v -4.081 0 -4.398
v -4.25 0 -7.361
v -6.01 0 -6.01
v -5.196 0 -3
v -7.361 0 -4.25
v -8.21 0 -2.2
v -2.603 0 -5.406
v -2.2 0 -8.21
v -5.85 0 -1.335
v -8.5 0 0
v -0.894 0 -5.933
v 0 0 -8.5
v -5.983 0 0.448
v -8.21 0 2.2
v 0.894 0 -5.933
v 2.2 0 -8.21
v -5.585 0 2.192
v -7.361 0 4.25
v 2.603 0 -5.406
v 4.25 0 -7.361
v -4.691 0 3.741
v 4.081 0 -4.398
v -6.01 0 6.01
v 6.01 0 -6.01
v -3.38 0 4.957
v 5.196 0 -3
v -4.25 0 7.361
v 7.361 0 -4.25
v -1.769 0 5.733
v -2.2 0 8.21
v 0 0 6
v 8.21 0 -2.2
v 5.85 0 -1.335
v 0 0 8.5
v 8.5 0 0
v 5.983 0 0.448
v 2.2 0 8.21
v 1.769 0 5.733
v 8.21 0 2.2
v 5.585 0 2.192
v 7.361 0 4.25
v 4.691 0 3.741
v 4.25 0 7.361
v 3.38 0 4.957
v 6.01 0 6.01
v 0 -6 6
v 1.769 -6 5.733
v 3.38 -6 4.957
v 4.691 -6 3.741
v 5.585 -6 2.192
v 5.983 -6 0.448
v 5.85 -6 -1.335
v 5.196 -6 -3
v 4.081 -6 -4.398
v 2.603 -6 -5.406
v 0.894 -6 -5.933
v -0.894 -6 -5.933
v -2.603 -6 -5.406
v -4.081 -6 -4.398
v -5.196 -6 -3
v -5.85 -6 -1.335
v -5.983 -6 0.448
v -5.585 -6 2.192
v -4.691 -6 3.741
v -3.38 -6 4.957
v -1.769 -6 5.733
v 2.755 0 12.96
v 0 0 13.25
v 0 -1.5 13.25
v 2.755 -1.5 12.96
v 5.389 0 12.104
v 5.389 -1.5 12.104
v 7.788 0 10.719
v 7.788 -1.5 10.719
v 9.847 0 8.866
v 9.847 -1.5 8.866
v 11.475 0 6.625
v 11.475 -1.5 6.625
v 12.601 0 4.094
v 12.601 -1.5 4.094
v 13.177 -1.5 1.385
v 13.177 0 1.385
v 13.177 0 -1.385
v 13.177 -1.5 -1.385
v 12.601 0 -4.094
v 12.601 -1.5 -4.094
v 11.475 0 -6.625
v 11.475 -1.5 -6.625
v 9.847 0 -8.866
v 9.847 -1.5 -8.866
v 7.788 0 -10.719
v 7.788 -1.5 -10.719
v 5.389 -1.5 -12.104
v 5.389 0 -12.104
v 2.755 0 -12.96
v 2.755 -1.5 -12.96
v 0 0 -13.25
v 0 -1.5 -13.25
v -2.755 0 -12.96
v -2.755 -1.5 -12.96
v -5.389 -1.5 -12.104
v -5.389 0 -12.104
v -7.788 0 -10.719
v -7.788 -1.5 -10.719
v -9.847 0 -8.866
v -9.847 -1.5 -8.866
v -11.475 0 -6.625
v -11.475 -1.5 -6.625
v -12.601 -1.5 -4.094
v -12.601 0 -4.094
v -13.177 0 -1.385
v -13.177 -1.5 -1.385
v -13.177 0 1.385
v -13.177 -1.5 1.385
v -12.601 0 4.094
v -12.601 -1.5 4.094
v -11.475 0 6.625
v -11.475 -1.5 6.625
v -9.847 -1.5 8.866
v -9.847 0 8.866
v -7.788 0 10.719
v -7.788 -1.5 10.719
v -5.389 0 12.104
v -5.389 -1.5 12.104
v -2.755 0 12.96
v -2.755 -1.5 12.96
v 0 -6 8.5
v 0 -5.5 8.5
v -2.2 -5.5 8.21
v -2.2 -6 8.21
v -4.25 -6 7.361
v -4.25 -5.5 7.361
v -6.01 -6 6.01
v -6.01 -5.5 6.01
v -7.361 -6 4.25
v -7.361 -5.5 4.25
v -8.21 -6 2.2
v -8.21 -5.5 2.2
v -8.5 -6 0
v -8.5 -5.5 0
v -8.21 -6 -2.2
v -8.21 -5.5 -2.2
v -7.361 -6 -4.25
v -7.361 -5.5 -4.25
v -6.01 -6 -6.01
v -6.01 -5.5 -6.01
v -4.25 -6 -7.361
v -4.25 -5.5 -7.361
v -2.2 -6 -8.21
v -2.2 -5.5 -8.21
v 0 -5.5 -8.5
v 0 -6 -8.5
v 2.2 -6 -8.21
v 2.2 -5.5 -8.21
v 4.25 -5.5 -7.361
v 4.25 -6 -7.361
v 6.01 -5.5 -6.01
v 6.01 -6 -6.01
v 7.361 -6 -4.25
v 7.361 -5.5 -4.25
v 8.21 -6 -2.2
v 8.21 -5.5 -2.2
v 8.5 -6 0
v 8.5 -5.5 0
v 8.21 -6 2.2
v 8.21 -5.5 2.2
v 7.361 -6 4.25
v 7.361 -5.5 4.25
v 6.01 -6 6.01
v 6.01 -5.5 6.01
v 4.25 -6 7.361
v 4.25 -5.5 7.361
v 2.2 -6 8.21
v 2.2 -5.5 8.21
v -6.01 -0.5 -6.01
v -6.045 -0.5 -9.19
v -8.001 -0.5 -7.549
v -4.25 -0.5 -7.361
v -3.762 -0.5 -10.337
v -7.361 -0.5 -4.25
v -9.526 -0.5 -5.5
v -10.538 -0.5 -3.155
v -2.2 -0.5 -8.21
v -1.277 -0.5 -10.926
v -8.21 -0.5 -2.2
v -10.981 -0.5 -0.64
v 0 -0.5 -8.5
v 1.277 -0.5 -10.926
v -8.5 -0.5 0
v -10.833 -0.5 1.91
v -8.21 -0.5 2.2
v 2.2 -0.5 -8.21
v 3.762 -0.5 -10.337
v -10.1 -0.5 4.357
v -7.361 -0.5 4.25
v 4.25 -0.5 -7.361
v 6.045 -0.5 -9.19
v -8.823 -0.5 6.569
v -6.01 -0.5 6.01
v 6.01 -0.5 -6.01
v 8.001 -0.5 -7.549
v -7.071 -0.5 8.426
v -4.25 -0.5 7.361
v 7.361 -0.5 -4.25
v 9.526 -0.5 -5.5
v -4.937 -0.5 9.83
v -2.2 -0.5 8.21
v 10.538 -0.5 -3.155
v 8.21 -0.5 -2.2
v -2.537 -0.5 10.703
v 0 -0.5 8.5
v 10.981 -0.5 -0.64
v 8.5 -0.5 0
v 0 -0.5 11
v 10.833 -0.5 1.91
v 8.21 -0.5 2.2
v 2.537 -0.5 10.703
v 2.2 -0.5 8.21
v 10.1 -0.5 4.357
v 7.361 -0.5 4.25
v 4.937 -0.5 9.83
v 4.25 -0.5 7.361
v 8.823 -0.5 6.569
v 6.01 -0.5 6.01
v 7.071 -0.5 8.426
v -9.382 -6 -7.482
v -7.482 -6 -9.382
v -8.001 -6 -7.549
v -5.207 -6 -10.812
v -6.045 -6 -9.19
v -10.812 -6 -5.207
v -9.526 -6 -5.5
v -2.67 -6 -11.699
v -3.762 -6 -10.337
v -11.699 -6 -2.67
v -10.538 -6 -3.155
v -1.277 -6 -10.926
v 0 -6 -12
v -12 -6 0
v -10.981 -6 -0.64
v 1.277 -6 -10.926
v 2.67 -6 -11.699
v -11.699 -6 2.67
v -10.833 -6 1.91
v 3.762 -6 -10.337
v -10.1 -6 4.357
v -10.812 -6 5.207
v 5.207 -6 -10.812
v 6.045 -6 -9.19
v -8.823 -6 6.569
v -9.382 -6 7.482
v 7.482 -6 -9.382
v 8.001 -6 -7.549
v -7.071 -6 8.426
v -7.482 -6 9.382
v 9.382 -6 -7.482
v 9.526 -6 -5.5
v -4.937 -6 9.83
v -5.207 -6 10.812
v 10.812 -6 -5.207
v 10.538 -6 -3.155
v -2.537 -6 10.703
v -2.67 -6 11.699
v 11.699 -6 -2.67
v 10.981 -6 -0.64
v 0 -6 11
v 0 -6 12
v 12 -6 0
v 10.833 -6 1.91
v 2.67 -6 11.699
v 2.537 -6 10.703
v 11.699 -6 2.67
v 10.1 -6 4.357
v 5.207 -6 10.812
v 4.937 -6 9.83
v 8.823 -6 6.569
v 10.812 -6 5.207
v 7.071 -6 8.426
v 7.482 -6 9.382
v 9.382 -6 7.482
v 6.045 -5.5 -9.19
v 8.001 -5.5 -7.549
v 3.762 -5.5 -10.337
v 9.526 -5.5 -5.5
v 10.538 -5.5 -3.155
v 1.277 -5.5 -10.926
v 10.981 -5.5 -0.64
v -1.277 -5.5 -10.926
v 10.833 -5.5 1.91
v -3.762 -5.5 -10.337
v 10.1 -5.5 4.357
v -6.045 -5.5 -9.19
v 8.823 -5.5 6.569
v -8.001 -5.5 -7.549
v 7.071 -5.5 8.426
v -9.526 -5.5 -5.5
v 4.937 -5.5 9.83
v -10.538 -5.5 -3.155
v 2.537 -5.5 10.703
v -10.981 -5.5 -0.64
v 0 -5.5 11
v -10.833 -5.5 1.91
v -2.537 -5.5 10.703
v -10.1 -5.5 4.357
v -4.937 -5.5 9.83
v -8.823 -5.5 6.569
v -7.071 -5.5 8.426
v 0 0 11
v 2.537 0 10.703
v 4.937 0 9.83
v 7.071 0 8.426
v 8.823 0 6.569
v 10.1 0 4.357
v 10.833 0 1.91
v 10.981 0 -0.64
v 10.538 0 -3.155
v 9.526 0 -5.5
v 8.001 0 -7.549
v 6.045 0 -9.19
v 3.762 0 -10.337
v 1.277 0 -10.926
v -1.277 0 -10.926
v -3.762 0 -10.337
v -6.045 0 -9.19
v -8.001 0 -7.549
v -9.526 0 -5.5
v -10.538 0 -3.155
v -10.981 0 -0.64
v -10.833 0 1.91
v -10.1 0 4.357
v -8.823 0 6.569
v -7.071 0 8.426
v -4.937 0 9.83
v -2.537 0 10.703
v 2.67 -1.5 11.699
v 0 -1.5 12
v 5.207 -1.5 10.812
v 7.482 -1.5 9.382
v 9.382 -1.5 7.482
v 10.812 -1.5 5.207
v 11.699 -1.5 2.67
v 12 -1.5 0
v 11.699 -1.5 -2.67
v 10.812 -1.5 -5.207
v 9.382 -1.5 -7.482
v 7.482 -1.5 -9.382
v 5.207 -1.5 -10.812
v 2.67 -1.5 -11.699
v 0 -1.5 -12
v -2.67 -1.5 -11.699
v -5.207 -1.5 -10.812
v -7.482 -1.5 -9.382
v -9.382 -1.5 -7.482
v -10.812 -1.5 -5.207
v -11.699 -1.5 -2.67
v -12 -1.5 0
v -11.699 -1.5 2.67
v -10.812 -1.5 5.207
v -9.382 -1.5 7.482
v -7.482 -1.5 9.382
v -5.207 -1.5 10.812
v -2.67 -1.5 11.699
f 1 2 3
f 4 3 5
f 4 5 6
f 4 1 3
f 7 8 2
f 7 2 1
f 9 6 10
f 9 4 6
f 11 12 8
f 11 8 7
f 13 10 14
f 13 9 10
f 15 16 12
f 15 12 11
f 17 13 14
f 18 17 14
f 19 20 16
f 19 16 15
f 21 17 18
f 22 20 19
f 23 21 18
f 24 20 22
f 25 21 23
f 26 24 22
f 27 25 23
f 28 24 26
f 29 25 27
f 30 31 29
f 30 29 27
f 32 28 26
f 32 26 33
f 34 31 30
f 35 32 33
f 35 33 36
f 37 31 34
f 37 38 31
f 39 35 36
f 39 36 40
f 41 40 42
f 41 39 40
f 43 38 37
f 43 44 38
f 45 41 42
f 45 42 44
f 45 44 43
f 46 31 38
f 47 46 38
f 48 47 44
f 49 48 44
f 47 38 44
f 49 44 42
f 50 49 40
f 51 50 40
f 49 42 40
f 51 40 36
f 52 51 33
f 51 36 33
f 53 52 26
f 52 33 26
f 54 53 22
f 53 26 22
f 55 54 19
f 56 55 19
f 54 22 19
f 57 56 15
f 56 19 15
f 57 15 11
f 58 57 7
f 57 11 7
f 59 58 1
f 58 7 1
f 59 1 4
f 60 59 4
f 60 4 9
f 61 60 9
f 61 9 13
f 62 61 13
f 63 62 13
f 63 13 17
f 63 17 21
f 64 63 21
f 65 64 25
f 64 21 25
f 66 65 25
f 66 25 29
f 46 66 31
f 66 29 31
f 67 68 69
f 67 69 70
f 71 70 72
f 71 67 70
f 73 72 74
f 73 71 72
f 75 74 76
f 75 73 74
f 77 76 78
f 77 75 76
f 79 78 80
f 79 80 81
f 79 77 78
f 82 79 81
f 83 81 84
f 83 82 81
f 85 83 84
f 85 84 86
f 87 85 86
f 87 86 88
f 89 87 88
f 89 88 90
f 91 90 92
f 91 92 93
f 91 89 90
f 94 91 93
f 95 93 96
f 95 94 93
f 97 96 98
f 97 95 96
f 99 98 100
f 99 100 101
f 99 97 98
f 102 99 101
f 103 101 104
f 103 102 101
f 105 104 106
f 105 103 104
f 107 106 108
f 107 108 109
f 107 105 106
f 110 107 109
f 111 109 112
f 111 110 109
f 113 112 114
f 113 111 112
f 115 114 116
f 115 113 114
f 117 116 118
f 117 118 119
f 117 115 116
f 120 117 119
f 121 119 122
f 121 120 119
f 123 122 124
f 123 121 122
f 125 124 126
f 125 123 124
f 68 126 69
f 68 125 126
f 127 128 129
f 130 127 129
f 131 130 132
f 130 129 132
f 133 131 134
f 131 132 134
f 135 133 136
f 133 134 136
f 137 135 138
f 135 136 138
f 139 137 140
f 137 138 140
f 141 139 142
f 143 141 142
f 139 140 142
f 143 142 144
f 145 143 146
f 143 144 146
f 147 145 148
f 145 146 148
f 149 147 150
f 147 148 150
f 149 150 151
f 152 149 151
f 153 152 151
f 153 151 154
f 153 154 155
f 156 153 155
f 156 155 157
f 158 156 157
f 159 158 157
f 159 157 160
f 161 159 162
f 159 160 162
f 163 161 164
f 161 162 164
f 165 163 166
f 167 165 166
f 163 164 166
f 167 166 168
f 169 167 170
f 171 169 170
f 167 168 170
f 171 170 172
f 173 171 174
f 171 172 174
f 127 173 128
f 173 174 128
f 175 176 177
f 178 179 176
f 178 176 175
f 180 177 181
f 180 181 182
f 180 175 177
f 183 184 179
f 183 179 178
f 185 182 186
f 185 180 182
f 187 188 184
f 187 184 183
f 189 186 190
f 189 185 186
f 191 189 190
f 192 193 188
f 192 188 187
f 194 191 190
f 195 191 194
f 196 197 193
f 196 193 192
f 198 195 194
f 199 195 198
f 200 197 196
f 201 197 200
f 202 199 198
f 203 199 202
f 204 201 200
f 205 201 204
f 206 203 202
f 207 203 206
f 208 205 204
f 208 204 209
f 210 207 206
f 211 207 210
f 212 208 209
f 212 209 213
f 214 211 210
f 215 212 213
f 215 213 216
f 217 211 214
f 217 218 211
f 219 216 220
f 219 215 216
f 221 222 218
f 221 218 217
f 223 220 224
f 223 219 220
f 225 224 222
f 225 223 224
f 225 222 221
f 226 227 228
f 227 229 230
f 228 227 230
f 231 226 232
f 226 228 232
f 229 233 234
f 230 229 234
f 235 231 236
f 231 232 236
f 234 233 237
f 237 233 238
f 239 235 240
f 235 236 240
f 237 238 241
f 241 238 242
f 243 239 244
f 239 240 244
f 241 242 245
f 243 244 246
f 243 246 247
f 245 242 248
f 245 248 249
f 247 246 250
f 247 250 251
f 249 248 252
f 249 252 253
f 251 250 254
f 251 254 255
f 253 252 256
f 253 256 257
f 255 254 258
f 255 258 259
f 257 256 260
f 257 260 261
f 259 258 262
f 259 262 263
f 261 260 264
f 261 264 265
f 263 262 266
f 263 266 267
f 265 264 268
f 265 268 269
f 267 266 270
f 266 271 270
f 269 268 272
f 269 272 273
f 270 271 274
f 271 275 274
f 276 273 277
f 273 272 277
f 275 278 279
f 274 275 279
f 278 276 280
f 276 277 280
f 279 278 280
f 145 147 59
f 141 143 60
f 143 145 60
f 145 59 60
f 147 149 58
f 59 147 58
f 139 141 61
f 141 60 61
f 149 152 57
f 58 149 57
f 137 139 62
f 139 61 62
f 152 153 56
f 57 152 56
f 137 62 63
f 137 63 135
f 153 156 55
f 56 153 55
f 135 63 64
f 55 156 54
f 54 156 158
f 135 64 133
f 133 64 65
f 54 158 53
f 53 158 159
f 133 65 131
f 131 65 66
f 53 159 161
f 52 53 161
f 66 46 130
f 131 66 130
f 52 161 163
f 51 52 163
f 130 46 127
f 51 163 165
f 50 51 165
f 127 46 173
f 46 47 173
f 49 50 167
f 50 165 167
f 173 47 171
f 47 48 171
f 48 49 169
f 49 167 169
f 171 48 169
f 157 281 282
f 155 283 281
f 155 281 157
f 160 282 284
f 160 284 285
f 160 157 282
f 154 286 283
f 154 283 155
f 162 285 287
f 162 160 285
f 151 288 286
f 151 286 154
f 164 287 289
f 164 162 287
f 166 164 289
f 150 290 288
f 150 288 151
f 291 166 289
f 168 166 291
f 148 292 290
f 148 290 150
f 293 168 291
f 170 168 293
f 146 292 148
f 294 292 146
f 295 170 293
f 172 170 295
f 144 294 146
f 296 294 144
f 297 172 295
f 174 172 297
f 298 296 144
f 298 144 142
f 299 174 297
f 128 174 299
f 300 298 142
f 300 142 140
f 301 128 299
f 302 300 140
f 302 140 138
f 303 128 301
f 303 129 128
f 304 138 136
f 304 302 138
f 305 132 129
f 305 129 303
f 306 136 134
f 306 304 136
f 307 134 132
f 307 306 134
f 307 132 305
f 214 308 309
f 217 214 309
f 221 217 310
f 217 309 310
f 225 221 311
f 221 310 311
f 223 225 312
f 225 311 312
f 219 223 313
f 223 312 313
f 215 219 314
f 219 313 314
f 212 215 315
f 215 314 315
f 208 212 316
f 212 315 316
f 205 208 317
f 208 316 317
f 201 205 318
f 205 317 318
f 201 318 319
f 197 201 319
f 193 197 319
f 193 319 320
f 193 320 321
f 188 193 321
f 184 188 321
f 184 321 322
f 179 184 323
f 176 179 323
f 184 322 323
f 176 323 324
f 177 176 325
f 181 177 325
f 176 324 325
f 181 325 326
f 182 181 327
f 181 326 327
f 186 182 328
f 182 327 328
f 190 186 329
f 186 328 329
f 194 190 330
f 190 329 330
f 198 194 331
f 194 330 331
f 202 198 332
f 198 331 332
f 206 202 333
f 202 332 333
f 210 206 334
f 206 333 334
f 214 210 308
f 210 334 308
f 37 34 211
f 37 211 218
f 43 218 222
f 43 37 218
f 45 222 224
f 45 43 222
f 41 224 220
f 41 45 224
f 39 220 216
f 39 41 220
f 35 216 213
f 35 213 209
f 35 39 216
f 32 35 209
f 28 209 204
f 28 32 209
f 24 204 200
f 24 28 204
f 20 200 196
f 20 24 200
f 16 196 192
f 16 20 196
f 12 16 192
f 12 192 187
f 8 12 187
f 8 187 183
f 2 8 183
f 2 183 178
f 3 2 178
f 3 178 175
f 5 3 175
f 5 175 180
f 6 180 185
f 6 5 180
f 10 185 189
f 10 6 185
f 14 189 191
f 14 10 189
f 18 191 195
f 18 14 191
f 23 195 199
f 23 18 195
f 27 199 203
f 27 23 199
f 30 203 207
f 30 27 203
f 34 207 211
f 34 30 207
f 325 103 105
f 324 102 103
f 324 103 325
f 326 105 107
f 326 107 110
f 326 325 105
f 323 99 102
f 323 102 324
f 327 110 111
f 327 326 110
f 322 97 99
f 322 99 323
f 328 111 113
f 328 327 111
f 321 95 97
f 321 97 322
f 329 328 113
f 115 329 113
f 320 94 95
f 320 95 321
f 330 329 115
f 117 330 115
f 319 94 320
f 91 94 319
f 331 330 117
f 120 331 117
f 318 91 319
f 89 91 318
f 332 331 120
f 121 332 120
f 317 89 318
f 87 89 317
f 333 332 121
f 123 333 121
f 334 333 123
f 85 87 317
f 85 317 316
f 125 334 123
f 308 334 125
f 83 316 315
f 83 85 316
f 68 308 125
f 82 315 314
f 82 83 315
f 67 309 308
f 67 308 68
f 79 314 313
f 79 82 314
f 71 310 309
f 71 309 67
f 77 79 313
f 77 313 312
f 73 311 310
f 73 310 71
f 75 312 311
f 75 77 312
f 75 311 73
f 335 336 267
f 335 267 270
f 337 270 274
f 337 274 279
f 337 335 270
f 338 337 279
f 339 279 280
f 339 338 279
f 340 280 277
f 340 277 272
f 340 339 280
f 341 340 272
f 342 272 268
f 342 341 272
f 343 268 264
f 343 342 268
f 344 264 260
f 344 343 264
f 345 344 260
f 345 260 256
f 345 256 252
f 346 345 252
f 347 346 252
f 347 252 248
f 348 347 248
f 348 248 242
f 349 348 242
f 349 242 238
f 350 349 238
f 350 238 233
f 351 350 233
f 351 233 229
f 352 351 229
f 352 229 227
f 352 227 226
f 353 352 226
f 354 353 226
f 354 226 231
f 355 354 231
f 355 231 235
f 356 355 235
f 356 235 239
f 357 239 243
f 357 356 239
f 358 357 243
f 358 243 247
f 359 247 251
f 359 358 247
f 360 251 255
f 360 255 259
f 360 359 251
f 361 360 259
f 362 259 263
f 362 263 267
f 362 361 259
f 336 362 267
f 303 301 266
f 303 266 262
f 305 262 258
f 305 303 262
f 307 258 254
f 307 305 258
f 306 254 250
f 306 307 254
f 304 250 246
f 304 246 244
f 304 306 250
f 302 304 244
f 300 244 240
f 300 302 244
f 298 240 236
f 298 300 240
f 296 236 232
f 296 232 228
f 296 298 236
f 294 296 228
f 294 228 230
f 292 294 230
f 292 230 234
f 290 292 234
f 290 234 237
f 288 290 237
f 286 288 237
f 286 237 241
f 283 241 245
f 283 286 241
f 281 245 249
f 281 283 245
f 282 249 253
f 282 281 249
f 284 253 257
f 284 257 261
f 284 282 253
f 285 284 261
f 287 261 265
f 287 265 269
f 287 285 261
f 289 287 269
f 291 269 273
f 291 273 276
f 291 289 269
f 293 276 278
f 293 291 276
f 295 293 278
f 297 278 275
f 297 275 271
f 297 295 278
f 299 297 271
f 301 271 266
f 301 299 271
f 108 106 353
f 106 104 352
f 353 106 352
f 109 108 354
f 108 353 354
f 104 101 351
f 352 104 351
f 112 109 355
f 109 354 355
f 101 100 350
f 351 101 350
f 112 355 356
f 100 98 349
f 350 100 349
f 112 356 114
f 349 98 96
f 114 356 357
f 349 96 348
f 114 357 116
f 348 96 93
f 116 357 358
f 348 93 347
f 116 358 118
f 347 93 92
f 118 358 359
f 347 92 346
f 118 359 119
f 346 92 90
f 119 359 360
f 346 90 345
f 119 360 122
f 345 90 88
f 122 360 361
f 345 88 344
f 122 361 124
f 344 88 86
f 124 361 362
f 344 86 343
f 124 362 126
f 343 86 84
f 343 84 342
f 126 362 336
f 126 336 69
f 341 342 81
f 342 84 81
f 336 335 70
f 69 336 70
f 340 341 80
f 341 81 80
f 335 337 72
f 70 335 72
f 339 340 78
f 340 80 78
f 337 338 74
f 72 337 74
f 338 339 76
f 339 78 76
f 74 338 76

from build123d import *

# Parameters (mm, degrees)
SKETCH1_R           = 12
SKETCH1_R_2         = 6
BOSS_EXTRUDE1_DEPTH = 6
SKETCH1_3_R         = 13.25
SKETCH1_3_R_2       = 12
BOSS_EXTRUDE2_DEPTH = 1.5
SKETCH2_R           = 11
SKETCH2_R_2         = 8.5
CUT_EXTRUDE1_DEPTH  = 0.5
CUT_EXTRUDE2_START  = -0.5
SKETCH3_R           = 11
SKETCH3_R_2         = 8.5
CUT_EXTRUDE2_DEPTH  = 0.5


with BuildPart() as part:
    # Sketch1 → Boss-Extrude1 (new body)
    with BuildSketch(Plane(origin=(0, 0, 0), x_dir=(1, 0, 0), z_dir=(0, 1, 0))):
        Circle(SKETCH1_R)
        Circle(SKETCH1_R_2, mode=Mode.SUBTRACT)
    extrude(amount=-BOSS_EXTRUDE1_DEPTH)

    # Sketch1<3> → Boss-Extrude2 (add)
    with BuildSketch(Plane(origin=(0, 0, 0), x_dir=(1, 0, 0), z_dir=(0, 1, 0))):
        Circle(SKETCH1_3_R)
        Circle(SKETCH1_3_R_2, mode=Mode.SUBTRACT)
    extrude(amount=-BOSS_EXTRUDE2_DEPTH)

    # Sketch2 → Cut-Extrude1 (cut)
    with BuildSketch(Plane(origin=(0, 0, 0), x_dir=(1, 0, 0), z_dir=(0, 1, 0))):
        Circle(SKETCH2_R)
        Circle(SKETCH2_R_2, mode=Mode.SUBTRACT)
    extrude(amount=-CUT_EXTRUDE1_DEPTH, mode=Mode.SUBTRACT)

    # Sketch3 → Cut-Extrude2 (cut)
    with BuildSketch(Plane.XZ.offset(6).offset(CUT_EXTRUDE2_START)):
        Circle(SKETCH3_R)
        Circle(SKETCH3_R_2, mode=Mode.SUBTRACT)
    extrude(amount=CUT_EXTRUDE2_DEPTH, mode=Mode.SUBTRACT)


solid = part.part
